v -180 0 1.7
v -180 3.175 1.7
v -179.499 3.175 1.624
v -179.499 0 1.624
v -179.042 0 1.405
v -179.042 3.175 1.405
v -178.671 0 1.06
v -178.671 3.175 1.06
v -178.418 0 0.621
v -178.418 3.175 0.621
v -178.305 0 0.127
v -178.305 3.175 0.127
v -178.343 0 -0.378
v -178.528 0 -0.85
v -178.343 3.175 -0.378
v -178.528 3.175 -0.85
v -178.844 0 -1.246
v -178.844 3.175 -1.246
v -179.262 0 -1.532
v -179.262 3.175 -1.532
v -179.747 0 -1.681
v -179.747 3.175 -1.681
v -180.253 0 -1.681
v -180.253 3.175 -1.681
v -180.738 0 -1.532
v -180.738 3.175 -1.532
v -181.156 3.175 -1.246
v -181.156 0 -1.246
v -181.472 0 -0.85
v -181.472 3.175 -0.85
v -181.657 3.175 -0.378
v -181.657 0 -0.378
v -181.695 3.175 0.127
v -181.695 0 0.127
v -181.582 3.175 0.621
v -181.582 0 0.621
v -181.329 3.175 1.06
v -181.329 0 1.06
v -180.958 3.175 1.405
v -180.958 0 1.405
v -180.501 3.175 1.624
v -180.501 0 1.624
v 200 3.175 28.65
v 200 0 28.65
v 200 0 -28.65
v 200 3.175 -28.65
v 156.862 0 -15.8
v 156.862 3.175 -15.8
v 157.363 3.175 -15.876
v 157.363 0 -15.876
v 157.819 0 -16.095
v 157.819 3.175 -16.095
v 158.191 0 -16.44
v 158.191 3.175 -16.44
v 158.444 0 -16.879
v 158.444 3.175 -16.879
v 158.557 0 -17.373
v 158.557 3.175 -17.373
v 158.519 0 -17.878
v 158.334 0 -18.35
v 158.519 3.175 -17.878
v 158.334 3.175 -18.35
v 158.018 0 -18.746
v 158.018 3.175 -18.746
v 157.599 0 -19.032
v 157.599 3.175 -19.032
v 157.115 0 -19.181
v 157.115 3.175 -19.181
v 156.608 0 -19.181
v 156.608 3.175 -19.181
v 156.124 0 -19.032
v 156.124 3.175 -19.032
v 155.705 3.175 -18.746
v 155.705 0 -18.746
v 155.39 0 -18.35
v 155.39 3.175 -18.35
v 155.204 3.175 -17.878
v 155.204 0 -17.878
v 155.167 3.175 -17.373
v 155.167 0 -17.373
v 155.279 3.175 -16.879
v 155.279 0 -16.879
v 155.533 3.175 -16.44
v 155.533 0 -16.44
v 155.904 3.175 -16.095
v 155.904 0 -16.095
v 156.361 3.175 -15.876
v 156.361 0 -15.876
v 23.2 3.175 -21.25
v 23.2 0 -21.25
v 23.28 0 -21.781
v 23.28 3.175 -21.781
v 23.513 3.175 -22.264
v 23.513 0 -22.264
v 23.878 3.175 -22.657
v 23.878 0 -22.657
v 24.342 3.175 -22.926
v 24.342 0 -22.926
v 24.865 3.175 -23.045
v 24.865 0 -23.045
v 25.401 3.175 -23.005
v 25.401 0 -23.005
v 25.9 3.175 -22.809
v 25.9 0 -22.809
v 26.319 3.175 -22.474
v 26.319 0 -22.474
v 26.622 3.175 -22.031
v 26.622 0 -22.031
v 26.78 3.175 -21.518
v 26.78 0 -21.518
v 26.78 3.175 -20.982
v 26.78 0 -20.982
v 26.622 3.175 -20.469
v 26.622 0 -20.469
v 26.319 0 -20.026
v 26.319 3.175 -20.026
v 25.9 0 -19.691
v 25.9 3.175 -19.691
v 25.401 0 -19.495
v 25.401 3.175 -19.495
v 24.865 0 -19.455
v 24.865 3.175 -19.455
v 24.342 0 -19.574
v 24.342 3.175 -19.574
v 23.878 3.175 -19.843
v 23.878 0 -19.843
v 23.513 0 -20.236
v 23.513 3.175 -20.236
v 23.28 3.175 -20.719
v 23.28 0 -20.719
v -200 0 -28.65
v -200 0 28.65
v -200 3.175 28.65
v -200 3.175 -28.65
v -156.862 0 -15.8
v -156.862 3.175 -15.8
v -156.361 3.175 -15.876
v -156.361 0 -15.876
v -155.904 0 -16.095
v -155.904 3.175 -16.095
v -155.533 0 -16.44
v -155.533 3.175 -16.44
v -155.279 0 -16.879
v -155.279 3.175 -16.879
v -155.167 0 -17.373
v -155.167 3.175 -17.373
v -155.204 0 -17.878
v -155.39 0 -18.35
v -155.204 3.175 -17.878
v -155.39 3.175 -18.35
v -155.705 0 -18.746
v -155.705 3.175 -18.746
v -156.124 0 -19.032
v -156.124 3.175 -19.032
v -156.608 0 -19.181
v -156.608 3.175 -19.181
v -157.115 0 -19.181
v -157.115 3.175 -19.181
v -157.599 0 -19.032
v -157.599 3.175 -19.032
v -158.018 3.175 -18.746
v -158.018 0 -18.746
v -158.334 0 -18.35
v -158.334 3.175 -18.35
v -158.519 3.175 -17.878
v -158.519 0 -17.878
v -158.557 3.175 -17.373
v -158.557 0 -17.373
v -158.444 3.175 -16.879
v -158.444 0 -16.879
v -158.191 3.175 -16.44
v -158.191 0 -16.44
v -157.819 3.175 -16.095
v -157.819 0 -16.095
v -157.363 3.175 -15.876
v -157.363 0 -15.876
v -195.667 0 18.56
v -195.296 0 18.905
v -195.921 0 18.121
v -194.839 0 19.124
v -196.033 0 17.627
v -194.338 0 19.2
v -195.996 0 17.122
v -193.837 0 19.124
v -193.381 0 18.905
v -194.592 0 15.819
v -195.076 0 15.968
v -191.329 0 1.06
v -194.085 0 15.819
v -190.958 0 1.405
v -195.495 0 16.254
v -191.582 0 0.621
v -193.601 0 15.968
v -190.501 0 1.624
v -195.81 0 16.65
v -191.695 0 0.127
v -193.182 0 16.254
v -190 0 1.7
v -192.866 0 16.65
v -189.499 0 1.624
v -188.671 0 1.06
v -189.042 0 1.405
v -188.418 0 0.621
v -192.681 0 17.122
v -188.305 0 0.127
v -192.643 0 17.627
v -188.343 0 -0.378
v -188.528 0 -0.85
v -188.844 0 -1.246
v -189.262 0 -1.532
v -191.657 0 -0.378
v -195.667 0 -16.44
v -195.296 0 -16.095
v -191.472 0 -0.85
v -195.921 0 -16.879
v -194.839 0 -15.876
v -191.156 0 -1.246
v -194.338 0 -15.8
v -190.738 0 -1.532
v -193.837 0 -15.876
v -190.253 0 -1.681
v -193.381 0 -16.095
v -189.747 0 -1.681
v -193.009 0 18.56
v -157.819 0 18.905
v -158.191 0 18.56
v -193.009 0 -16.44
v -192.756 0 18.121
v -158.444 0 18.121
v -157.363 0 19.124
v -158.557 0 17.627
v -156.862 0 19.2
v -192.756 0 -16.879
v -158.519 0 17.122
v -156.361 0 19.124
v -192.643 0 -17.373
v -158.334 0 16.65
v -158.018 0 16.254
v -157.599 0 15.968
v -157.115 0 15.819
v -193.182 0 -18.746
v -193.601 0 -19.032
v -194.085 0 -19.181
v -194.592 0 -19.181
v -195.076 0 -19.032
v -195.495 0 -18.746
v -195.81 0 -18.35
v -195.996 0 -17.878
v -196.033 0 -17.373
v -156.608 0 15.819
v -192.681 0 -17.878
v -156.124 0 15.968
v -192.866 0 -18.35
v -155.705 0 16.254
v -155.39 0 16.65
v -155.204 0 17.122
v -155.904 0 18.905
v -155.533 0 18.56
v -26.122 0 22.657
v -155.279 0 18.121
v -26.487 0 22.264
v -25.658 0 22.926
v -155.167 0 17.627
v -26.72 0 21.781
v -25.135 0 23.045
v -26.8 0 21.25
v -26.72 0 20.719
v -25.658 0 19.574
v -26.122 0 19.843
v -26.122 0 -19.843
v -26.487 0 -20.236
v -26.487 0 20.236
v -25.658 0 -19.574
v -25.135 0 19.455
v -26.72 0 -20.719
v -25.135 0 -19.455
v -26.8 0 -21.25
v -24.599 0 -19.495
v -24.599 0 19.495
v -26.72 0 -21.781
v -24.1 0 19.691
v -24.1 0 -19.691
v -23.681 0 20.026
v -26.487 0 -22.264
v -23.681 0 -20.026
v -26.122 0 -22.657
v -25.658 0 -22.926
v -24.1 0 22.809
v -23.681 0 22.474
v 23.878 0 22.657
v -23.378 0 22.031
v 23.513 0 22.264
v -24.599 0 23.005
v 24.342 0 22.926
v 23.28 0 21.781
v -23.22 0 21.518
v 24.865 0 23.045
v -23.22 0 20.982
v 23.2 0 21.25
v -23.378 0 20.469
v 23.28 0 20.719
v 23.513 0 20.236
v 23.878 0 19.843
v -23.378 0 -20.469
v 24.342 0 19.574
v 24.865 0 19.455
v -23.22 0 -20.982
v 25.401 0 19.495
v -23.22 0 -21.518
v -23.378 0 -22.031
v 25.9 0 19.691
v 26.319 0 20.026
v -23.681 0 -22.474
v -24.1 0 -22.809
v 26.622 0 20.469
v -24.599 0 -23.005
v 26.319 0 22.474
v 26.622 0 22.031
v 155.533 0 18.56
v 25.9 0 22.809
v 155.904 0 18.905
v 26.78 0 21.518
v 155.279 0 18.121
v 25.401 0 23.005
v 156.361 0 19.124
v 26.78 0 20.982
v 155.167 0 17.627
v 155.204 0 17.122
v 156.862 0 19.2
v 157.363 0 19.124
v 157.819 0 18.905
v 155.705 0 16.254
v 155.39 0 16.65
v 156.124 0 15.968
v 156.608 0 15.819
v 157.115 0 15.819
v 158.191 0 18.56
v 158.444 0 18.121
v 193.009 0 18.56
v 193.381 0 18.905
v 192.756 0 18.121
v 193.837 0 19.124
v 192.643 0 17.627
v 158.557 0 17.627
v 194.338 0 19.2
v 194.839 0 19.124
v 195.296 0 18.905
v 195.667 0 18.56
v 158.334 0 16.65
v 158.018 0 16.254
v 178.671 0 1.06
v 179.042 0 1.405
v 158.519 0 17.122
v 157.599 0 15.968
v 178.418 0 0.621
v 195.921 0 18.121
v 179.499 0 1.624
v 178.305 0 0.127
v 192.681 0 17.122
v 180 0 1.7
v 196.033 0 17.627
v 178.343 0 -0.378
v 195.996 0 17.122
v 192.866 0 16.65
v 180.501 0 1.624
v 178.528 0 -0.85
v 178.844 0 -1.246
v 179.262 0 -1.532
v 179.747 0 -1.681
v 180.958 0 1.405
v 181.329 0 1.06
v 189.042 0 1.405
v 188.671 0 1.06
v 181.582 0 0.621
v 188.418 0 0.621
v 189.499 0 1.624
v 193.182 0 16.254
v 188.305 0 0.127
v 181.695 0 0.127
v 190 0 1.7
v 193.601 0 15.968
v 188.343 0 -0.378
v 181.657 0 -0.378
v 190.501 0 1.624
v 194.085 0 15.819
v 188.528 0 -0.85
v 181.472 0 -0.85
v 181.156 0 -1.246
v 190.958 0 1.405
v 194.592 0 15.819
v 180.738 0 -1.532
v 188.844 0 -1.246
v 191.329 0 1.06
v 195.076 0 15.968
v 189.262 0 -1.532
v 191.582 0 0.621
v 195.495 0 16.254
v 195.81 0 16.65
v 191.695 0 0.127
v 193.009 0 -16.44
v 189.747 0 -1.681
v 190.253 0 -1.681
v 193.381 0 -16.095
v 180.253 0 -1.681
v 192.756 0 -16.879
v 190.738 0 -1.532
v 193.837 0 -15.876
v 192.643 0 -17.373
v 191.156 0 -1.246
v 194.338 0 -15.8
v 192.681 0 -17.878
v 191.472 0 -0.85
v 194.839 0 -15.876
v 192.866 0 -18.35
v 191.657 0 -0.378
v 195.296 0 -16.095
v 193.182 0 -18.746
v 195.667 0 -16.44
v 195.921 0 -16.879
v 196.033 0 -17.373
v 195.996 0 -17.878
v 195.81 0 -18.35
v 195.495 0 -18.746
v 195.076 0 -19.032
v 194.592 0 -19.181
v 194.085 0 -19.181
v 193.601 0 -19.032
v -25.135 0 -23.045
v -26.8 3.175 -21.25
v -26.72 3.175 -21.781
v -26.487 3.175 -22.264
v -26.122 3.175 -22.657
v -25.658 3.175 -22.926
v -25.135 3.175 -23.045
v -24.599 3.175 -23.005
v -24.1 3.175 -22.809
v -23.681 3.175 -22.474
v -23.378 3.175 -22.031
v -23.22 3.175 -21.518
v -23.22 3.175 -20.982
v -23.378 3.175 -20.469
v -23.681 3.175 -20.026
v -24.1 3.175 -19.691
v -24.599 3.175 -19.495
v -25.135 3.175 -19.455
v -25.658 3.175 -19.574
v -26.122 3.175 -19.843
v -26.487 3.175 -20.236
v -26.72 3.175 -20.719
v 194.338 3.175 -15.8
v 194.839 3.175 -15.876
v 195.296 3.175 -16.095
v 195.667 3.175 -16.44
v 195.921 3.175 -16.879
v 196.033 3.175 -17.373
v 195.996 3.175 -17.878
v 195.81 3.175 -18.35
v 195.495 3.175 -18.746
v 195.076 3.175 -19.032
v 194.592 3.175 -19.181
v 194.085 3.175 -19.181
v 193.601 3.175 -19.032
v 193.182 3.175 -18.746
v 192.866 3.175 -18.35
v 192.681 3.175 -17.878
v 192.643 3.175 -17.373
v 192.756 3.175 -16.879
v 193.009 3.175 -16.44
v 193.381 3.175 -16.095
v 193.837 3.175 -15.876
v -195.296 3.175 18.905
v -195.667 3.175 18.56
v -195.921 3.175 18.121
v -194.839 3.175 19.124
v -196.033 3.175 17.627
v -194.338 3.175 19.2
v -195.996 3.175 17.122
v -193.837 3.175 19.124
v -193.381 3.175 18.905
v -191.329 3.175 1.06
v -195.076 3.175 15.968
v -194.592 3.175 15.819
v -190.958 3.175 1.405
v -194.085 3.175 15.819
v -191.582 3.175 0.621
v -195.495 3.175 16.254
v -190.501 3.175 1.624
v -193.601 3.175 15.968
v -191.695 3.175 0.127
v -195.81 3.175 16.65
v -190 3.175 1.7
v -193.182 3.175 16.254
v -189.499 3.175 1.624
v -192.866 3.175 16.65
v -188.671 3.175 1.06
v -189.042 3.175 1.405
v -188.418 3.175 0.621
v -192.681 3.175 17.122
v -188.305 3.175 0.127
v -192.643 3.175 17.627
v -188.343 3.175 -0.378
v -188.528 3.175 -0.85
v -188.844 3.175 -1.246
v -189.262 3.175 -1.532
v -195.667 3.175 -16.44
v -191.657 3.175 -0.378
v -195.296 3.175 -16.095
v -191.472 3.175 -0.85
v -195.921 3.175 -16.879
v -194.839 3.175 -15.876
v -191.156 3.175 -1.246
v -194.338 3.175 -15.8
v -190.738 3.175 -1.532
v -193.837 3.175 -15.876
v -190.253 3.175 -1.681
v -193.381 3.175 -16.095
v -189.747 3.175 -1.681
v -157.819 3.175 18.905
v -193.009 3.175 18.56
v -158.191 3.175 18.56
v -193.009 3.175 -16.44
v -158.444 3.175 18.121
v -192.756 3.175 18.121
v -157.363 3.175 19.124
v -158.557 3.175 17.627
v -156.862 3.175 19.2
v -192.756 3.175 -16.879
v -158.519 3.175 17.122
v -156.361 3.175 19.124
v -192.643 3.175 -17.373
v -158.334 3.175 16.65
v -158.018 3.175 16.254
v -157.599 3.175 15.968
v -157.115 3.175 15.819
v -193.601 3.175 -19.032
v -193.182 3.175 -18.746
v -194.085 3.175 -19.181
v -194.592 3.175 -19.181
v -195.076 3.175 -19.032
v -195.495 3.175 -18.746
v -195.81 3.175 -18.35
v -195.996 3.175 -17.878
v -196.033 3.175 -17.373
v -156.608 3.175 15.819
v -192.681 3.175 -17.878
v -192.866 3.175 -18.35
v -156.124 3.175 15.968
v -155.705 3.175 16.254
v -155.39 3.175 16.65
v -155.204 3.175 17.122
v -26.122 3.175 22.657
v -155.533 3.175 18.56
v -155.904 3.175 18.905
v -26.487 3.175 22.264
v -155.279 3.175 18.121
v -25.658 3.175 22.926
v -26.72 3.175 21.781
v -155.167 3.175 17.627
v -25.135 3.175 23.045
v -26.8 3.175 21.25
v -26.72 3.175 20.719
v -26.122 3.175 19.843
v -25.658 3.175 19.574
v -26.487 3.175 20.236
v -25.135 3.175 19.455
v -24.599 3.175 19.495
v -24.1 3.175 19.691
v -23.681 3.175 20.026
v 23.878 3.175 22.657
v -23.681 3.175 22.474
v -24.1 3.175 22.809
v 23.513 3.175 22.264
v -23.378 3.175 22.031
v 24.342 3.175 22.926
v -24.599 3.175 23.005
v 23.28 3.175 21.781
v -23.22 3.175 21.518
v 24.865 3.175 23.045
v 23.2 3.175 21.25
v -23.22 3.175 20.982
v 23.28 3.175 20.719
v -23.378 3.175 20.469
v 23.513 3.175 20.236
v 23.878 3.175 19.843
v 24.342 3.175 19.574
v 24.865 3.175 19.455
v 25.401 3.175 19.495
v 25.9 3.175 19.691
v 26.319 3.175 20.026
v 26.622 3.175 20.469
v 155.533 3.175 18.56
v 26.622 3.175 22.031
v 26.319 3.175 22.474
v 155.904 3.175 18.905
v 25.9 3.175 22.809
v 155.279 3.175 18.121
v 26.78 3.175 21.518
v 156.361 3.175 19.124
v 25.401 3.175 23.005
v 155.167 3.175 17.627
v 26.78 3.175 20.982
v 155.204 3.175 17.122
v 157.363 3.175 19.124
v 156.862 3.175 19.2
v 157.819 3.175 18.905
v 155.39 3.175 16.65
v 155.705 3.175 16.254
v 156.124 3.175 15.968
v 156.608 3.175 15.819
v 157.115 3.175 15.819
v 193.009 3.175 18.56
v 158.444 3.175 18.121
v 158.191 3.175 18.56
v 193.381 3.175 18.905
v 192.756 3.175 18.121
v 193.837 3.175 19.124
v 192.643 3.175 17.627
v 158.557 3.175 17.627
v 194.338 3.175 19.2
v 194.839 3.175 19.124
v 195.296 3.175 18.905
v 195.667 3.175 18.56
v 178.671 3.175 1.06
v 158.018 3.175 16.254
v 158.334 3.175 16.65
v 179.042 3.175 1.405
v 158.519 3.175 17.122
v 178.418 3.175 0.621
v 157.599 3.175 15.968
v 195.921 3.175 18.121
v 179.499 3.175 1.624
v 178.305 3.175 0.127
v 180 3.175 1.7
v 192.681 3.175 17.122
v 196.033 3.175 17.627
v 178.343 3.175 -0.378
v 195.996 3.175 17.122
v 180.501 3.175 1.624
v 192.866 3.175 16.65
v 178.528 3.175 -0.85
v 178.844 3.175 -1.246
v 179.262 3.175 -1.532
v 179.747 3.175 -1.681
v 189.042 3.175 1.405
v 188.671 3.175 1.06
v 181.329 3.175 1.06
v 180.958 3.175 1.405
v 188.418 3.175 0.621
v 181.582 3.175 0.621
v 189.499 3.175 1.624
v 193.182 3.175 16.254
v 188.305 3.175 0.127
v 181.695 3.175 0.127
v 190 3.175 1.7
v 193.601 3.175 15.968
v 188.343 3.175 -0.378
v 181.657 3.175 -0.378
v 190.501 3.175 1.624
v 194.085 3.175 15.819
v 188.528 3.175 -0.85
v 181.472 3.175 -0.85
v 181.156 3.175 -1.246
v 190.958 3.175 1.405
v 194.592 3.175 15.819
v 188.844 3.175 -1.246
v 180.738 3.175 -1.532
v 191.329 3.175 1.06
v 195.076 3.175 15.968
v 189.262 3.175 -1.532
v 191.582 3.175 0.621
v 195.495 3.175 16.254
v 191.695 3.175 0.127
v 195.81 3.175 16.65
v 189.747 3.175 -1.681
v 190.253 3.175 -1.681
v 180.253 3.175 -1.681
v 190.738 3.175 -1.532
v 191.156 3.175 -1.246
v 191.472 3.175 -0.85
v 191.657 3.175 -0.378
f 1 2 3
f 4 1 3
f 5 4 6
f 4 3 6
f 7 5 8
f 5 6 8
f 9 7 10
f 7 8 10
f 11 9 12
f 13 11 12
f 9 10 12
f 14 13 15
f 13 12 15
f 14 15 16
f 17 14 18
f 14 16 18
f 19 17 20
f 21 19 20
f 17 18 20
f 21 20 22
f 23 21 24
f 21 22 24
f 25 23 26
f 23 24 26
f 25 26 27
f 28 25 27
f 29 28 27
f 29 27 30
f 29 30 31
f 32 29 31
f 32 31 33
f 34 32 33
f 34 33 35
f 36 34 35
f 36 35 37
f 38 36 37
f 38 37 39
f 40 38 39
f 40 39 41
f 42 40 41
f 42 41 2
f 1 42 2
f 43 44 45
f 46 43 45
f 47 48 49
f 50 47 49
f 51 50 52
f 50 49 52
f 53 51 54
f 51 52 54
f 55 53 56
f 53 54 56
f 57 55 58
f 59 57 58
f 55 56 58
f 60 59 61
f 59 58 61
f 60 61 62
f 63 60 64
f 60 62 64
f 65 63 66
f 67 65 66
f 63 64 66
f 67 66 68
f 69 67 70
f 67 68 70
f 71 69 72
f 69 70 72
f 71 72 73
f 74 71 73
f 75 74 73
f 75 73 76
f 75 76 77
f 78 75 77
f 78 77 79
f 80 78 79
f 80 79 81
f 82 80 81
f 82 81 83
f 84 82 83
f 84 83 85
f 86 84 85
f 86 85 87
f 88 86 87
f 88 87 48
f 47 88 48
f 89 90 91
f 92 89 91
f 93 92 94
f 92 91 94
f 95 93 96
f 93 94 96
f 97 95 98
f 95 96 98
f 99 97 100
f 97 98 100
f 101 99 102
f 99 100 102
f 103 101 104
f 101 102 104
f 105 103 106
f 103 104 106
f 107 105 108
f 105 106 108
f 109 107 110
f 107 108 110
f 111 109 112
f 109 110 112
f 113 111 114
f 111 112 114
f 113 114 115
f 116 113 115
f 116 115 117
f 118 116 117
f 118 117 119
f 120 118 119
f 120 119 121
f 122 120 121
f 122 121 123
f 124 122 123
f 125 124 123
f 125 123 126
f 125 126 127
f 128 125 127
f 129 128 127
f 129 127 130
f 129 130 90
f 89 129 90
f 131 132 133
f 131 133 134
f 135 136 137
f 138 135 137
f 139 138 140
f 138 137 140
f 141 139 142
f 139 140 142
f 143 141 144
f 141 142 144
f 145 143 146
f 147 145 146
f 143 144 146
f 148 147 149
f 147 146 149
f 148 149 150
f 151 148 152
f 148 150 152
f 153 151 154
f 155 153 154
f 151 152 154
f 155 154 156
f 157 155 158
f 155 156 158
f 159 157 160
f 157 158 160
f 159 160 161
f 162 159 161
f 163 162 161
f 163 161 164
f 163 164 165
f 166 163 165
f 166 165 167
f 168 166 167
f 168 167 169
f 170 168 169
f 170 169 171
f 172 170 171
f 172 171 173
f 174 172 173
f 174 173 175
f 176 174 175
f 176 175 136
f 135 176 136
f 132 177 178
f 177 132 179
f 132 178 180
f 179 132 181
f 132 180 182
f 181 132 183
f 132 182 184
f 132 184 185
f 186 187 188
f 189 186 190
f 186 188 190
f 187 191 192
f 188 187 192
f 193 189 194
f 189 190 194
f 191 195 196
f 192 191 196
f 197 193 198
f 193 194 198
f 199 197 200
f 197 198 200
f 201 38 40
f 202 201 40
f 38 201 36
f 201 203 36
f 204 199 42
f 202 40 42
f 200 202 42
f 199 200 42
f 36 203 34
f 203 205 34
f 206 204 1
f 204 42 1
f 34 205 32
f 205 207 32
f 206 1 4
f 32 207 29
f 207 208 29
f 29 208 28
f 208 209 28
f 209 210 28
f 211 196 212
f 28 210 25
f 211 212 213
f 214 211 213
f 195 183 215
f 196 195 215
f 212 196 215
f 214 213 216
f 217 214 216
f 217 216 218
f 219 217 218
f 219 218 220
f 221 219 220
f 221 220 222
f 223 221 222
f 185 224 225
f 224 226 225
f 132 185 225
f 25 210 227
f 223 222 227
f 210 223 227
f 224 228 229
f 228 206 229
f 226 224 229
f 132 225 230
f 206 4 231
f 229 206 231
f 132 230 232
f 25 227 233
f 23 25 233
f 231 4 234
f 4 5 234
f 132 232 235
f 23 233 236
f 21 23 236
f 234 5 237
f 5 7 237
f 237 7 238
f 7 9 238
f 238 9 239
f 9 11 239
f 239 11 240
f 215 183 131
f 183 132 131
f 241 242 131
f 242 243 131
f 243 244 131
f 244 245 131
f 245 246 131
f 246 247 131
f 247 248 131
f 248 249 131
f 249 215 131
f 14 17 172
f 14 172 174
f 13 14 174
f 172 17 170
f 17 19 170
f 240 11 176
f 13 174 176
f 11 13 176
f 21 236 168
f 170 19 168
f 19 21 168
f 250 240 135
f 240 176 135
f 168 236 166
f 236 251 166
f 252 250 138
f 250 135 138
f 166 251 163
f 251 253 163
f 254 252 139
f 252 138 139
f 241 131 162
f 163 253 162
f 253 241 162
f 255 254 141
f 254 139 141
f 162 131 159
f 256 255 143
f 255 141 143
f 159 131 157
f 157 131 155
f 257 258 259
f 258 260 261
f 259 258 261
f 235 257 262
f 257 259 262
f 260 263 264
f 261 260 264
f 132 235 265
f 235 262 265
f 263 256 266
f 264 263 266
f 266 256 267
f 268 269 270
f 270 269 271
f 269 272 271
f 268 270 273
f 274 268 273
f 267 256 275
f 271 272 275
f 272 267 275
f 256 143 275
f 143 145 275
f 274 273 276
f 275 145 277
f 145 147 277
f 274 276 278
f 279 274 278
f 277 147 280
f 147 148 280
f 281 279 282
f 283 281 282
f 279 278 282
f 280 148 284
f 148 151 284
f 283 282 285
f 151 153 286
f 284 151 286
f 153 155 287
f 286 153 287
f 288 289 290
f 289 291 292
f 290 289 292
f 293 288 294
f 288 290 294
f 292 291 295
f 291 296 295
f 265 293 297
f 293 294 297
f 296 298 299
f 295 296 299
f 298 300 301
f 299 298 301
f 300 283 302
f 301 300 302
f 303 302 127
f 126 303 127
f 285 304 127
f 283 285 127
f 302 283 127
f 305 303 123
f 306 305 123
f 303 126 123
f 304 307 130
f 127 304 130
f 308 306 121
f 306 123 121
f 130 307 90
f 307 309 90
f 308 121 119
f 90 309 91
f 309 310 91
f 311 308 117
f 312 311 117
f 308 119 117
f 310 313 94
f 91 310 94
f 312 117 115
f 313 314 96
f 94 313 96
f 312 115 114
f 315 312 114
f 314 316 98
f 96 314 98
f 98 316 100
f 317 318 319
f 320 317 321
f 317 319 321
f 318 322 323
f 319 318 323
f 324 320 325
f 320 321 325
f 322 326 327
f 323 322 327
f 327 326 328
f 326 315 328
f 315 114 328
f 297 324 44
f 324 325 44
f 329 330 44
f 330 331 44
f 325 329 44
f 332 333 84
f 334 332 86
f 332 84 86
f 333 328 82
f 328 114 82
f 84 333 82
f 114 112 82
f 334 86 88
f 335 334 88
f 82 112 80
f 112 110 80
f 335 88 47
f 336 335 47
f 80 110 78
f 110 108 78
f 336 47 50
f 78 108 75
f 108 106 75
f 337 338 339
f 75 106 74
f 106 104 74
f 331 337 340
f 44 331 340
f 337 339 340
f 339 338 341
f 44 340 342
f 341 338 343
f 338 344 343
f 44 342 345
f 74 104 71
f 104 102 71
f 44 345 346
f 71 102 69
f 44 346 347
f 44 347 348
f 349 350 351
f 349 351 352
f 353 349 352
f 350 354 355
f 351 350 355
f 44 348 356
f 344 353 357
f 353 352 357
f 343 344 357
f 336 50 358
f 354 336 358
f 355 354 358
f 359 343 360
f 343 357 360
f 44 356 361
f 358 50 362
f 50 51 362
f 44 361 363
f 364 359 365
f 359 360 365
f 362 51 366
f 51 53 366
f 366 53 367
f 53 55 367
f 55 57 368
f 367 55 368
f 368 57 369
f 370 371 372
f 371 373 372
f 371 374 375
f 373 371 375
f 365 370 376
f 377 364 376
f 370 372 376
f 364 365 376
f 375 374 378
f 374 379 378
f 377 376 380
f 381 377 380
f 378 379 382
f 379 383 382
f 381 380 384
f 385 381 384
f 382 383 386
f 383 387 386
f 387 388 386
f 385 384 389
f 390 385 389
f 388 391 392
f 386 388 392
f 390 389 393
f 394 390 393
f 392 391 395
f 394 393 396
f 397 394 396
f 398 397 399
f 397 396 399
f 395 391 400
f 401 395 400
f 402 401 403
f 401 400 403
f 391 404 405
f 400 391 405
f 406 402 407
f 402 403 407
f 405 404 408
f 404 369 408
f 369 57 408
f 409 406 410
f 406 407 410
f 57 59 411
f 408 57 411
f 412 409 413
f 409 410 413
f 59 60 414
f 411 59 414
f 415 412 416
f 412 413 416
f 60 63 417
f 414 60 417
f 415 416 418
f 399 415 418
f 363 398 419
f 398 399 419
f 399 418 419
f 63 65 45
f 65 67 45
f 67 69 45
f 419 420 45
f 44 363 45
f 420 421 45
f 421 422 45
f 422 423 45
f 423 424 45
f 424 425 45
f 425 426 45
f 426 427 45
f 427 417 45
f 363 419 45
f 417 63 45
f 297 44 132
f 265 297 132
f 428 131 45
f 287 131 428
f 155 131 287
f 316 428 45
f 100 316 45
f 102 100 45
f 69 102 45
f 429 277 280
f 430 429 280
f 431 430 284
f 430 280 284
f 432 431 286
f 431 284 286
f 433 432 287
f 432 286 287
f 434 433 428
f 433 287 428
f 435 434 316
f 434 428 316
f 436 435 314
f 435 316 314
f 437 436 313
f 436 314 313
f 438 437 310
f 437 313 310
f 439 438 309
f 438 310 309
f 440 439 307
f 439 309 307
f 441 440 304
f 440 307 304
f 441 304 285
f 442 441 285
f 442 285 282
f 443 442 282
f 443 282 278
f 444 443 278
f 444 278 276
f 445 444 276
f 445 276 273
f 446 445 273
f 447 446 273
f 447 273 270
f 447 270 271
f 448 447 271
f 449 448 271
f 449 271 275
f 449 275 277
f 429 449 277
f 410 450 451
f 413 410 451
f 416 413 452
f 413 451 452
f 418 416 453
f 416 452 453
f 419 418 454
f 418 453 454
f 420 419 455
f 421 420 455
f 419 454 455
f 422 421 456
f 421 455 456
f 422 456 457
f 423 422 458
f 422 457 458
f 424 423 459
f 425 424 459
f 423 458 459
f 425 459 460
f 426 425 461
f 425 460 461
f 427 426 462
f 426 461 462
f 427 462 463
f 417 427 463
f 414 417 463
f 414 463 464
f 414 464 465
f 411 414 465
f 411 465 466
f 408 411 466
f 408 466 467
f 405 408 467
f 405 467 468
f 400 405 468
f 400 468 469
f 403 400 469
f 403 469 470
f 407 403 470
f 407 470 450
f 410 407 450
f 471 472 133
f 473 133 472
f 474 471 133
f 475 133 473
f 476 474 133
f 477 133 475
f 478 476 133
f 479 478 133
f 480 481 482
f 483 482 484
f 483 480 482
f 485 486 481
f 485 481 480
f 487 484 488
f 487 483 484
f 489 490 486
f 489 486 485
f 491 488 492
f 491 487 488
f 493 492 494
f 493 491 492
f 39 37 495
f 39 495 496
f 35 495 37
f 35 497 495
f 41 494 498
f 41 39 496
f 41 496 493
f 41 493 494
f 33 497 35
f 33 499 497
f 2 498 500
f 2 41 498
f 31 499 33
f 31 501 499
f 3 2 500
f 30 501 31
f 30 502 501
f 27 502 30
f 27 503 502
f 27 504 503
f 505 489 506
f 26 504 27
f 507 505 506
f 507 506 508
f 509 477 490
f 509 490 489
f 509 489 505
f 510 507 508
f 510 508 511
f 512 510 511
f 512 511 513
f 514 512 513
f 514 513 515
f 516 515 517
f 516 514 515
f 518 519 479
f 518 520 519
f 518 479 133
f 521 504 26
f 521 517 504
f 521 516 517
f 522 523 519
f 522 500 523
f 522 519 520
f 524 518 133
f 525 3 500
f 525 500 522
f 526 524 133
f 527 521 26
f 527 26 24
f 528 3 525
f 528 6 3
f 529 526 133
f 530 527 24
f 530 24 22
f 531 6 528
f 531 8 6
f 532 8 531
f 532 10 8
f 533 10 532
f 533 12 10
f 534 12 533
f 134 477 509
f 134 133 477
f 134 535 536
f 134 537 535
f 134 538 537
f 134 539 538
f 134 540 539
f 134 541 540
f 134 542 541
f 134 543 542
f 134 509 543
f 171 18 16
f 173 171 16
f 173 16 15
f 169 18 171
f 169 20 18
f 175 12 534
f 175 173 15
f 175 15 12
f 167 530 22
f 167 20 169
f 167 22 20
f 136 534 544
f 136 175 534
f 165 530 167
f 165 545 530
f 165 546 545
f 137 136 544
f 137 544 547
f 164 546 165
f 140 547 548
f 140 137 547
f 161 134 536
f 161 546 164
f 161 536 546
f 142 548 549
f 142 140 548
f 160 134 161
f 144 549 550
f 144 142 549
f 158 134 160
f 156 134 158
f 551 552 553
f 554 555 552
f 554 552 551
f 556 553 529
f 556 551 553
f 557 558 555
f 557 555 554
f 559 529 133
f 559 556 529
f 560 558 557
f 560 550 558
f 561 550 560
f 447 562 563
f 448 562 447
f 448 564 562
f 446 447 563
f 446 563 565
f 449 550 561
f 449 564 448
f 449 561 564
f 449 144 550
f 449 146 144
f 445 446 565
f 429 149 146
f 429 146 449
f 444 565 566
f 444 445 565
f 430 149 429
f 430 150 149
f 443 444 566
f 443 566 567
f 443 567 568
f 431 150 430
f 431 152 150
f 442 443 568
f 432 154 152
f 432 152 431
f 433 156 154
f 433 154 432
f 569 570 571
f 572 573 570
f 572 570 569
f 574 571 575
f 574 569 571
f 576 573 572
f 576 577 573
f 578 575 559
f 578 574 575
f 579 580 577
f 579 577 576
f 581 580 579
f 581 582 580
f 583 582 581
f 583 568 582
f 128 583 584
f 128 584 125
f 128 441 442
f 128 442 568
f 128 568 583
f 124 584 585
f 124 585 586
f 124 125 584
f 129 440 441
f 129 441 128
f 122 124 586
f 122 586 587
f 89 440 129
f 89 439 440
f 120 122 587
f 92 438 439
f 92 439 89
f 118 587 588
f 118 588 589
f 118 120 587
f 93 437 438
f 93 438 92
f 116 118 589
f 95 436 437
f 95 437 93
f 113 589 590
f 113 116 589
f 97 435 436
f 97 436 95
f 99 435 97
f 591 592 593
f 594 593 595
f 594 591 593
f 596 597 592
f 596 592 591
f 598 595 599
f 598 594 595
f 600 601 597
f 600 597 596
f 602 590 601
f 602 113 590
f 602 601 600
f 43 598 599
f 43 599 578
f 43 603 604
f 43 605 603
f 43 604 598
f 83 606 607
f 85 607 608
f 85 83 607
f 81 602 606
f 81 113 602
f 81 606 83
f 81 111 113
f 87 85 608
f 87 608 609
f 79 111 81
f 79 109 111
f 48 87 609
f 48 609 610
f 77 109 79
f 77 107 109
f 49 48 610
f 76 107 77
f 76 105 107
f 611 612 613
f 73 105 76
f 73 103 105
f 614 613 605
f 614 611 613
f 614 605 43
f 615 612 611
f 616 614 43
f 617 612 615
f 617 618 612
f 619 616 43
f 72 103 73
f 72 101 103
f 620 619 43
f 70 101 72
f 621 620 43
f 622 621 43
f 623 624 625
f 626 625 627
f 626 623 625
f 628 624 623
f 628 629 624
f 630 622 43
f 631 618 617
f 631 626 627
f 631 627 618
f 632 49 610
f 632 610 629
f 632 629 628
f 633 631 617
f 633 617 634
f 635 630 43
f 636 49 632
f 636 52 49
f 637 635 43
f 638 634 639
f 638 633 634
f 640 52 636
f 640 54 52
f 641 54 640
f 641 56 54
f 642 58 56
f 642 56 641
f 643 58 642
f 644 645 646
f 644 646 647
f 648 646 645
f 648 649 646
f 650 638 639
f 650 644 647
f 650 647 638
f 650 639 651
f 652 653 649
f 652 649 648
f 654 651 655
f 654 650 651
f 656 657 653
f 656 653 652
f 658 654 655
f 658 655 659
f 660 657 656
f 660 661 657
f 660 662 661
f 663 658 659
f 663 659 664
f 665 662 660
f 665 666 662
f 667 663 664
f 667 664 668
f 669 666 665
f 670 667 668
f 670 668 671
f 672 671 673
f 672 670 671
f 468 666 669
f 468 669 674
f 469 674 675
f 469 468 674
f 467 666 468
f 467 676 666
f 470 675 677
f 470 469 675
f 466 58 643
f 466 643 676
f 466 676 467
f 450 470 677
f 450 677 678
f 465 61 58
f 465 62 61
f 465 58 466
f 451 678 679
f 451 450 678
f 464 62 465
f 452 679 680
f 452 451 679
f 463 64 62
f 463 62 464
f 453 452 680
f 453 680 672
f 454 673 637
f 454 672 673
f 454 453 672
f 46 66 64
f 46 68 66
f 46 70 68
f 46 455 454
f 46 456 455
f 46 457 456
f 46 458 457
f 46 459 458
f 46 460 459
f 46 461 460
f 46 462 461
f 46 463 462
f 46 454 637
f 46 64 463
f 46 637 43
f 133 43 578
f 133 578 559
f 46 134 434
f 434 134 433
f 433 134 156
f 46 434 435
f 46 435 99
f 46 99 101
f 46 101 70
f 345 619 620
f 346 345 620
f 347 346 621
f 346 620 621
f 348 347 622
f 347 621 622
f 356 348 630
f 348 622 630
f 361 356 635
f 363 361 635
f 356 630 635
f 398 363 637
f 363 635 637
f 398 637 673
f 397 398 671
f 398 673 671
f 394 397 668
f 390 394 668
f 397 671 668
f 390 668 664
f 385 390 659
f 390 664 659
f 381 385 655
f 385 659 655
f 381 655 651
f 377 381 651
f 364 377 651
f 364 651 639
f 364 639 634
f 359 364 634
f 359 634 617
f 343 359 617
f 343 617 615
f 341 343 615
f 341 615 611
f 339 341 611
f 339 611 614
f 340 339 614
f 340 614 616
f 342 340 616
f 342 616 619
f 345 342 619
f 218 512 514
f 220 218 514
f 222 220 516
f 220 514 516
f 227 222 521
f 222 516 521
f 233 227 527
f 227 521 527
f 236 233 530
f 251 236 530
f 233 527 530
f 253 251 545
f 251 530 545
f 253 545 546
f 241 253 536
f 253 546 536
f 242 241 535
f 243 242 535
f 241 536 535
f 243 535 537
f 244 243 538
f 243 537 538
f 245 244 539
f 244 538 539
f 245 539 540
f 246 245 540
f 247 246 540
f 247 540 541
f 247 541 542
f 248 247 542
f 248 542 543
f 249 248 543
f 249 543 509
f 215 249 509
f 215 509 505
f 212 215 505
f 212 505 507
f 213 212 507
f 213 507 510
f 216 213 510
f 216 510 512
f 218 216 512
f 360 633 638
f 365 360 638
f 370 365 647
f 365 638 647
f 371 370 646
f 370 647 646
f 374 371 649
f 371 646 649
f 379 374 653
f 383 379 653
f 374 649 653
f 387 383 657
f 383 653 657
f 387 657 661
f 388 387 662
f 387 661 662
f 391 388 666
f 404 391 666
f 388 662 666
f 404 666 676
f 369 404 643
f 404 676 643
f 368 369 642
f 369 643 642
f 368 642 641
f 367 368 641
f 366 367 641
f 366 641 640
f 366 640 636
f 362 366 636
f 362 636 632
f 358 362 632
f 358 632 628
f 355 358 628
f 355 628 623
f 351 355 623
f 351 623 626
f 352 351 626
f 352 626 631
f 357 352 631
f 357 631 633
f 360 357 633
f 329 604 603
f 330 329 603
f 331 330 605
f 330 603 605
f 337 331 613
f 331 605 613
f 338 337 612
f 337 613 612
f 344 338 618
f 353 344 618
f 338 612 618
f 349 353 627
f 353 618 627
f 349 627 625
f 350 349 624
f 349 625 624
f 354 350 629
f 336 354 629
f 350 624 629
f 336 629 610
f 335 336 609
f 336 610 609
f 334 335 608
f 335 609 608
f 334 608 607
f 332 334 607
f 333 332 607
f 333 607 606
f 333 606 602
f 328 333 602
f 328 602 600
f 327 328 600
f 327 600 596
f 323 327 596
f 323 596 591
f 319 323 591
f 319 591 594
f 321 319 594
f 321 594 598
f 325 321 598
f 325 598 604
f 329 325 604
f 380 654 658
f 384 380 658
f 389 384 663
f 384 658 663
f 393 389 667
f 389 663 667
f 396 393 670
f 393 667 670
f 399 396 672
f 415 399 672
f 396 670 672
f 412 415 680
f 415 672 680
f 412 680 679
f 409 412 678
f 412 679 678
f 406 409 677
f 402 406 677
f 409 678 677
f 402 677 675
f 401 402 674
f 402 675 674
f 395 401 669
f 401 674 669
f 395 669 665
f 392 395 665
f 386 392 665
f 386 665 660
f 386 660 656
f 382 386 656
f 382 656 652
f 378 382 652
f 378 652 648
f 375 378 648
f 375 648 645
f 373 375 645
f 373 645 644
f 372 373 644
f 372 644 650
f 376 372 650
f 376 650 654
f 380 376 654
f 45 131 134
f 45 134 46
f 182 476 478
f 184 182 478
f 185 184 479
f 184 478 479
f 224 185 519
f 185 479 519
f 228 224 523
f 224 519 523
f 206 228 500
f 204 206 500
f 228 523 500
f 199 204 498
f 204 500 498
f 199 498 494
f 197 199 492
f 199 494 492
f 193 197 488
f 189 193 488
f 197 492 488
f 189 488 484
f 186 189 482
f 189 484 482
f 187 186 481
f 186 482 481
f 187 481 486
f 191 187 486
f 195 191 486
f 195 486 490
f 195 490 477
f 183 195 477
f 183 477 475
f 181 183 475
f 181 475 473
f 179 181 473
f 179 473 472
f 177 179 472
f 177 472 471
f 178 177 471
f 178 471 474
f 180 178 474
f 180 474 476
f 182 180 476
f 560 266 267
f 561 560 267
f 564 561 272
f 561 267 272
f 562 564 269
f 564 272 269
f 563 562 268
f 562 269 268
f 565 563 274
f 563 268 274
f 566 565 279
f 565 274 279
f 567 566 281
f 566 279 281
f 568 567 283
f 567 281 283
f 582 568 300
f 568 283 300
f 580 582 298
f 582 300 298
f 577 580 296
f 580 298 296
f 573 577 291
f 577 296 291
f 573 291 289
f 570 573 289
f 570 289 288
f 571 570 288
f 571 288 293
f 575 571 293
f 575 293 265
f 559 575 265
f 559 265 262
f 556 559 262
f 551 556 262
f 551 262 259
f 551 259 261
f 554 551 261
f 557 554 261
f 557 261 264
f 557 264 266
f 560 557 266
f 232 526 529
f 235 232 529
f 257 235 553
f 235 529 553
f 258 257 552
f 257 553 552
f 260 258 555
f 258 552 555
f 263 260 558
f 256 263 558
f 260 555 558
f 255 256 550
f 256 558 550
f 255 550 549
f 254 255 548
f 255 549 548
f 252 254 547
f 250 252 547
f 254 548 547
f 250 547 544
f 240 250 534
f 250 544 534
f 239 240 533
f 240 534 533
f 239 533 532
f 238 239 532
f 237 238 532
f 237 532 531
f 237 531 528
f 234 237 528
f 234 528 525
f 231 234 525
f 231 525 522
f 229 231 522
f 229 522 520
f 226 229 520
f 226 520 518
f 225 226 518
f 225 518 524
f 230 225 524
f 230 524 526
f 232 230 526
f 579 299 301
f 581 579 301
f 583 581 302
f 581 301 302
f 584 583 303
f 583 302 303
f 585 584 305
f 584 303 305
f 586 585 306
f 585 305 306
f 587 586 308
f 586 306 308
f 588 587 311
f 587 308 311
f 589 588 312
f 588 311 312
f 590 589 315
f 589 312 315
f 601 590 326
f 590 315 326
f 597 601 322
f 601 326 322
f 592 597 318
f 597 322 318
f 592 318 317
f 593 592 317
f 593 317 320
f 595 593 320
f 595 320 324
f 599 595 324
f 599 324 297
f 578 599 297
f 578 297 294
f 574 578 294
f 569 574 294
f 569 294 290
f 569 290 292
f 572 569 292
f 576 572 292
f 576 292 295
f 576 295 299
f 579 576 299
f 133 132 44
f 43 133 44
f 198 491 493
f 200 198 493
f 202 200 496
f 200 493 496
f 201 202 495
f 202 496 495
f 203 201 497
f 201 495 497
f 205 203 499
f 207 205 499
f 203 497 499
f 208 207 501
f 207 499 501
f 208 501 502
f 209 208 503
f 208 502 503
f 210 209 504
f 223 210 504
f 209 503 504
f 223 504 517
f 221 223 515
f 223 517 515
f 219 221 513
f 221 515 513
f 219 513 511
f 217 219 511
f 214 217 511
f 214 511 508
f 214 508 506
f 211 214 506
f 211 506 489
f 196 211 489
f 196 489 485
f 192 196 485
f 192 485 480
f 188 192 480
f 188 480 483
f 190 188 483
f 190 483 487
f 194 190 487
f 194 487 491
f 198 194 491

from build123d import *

# Parameters (mm, degrees)
SKETCH1_W                = 400
SKETCH1_H                = 57.3
BOSS_EXTRUDE1_DEPTH      = 3.175
SKETCH2_R                = 1.7
CUT_EXTRUDE1_DEPTH       = 203.066580921
M3_CLEARANCE_HOLE1_D     = 3.6
M3_CLEARANCE_HOLE1_DEPTH = 3.918450886
M3_CLEARANCE_HOLE1_TIP   = 1.081549114


with BuildPart() as part:
    # Sketch1 → Boss-Extrude1 (new body)
    with BuildSketch(Plane(origin=(0, 0, 0), x_dir=(1, 0, 0), z_dir=(0, 1, 0))):
        Rectangle(SKETCH1_W, SKETCH1_H)
    extrude(amount=BOSS_EXTRUDE1_DEPTH)

    # Sketch2 → Cut-Extrude1 (cut, through all)
    with BuildSketch(Plane(origin=(0, 3.175, 0), x_dir=(1, 0, 0), z_dir=(0, 1, 0))):
        with Locations(Location((-194.338207547, -17.5, 0), (0, 0, 270))):
            Circle(SKETCH2_R)
        with Locations(Location((-194.338207547, 17.5, 0), (0, 0, 270))):
            Circle(SKETCH2_R)
        with Locations(Location((-190, -4e-09, 0), (0, 0, 270))):
            Circle(SKETCH2_R)
        with Locations(Location((-180, -4e-09, 0), (0, 0, 270))):
            Circle(SKETCH2_R)
        with Locations(Location((-156.861792453, -17.5, 0), (0, 0, 270))):
            Circle(SKETCH2_R)
        with Locations(Location((-156.861792453, 17.5, 0), (0, 0, 270))):
            Circle(SKETCH2_R)
        with Locations(Location((156.861792453, 17.5, 0), (0, 0, 270))):
            Circle(SKETCH2_R)
        with Locations(Location((156.861792453, -17.5, 0), (0, 0, 270))):
            Circle(SKETCH2_R)
        with Locations(Location((194.338207547, -17.5, 0), (0, 0, 270))):
            Circle(SKETCH2_R)
        with Locations(Location((180, 4e-09, 0), (0, 0, 270))):
            Circle(SKETCH2_R)
        with Locations(Location((190, 4e-09, 0), (0, 0, 270))):
            Circle(SKETCH2_R)
        with Locations(Location((194.338207547, 17.5, 0), (0, 0, 270))):
            Circle(SKETCH2_R)
    extrude(amount=-CUT_EXTRUDE1_DEPTH, mode=Mode.SUBTRACT)

    # M3 Clearance Hole1
    with Locations(Plane(origin=(0, 3.175, 0), x_dir=(1, 0, 0), z_dir=(0, 1, 0))):
        with Locations((25, -21.25), (-25, 21.25), (-25, -21.25), (25, 21.25)):
            Hole(M3_CLEARANCE_HOLE1_D / 2, depth=M3_CLEARANCE_HOLE1_DEPTH)
            with Locations((0, 0, -(M3_CLEARANCE_HOLE1_DEPTH + M3_CLEARANCE_HOLE1_TIP / 2))):  # 118° drill point
                Cone(0, M3_CLEARANCE_HOLE1_D / 2, M3_CLEARANCE_HOLE1_TIP, mode=Mode.SUBTRACT)


solid = part.part
